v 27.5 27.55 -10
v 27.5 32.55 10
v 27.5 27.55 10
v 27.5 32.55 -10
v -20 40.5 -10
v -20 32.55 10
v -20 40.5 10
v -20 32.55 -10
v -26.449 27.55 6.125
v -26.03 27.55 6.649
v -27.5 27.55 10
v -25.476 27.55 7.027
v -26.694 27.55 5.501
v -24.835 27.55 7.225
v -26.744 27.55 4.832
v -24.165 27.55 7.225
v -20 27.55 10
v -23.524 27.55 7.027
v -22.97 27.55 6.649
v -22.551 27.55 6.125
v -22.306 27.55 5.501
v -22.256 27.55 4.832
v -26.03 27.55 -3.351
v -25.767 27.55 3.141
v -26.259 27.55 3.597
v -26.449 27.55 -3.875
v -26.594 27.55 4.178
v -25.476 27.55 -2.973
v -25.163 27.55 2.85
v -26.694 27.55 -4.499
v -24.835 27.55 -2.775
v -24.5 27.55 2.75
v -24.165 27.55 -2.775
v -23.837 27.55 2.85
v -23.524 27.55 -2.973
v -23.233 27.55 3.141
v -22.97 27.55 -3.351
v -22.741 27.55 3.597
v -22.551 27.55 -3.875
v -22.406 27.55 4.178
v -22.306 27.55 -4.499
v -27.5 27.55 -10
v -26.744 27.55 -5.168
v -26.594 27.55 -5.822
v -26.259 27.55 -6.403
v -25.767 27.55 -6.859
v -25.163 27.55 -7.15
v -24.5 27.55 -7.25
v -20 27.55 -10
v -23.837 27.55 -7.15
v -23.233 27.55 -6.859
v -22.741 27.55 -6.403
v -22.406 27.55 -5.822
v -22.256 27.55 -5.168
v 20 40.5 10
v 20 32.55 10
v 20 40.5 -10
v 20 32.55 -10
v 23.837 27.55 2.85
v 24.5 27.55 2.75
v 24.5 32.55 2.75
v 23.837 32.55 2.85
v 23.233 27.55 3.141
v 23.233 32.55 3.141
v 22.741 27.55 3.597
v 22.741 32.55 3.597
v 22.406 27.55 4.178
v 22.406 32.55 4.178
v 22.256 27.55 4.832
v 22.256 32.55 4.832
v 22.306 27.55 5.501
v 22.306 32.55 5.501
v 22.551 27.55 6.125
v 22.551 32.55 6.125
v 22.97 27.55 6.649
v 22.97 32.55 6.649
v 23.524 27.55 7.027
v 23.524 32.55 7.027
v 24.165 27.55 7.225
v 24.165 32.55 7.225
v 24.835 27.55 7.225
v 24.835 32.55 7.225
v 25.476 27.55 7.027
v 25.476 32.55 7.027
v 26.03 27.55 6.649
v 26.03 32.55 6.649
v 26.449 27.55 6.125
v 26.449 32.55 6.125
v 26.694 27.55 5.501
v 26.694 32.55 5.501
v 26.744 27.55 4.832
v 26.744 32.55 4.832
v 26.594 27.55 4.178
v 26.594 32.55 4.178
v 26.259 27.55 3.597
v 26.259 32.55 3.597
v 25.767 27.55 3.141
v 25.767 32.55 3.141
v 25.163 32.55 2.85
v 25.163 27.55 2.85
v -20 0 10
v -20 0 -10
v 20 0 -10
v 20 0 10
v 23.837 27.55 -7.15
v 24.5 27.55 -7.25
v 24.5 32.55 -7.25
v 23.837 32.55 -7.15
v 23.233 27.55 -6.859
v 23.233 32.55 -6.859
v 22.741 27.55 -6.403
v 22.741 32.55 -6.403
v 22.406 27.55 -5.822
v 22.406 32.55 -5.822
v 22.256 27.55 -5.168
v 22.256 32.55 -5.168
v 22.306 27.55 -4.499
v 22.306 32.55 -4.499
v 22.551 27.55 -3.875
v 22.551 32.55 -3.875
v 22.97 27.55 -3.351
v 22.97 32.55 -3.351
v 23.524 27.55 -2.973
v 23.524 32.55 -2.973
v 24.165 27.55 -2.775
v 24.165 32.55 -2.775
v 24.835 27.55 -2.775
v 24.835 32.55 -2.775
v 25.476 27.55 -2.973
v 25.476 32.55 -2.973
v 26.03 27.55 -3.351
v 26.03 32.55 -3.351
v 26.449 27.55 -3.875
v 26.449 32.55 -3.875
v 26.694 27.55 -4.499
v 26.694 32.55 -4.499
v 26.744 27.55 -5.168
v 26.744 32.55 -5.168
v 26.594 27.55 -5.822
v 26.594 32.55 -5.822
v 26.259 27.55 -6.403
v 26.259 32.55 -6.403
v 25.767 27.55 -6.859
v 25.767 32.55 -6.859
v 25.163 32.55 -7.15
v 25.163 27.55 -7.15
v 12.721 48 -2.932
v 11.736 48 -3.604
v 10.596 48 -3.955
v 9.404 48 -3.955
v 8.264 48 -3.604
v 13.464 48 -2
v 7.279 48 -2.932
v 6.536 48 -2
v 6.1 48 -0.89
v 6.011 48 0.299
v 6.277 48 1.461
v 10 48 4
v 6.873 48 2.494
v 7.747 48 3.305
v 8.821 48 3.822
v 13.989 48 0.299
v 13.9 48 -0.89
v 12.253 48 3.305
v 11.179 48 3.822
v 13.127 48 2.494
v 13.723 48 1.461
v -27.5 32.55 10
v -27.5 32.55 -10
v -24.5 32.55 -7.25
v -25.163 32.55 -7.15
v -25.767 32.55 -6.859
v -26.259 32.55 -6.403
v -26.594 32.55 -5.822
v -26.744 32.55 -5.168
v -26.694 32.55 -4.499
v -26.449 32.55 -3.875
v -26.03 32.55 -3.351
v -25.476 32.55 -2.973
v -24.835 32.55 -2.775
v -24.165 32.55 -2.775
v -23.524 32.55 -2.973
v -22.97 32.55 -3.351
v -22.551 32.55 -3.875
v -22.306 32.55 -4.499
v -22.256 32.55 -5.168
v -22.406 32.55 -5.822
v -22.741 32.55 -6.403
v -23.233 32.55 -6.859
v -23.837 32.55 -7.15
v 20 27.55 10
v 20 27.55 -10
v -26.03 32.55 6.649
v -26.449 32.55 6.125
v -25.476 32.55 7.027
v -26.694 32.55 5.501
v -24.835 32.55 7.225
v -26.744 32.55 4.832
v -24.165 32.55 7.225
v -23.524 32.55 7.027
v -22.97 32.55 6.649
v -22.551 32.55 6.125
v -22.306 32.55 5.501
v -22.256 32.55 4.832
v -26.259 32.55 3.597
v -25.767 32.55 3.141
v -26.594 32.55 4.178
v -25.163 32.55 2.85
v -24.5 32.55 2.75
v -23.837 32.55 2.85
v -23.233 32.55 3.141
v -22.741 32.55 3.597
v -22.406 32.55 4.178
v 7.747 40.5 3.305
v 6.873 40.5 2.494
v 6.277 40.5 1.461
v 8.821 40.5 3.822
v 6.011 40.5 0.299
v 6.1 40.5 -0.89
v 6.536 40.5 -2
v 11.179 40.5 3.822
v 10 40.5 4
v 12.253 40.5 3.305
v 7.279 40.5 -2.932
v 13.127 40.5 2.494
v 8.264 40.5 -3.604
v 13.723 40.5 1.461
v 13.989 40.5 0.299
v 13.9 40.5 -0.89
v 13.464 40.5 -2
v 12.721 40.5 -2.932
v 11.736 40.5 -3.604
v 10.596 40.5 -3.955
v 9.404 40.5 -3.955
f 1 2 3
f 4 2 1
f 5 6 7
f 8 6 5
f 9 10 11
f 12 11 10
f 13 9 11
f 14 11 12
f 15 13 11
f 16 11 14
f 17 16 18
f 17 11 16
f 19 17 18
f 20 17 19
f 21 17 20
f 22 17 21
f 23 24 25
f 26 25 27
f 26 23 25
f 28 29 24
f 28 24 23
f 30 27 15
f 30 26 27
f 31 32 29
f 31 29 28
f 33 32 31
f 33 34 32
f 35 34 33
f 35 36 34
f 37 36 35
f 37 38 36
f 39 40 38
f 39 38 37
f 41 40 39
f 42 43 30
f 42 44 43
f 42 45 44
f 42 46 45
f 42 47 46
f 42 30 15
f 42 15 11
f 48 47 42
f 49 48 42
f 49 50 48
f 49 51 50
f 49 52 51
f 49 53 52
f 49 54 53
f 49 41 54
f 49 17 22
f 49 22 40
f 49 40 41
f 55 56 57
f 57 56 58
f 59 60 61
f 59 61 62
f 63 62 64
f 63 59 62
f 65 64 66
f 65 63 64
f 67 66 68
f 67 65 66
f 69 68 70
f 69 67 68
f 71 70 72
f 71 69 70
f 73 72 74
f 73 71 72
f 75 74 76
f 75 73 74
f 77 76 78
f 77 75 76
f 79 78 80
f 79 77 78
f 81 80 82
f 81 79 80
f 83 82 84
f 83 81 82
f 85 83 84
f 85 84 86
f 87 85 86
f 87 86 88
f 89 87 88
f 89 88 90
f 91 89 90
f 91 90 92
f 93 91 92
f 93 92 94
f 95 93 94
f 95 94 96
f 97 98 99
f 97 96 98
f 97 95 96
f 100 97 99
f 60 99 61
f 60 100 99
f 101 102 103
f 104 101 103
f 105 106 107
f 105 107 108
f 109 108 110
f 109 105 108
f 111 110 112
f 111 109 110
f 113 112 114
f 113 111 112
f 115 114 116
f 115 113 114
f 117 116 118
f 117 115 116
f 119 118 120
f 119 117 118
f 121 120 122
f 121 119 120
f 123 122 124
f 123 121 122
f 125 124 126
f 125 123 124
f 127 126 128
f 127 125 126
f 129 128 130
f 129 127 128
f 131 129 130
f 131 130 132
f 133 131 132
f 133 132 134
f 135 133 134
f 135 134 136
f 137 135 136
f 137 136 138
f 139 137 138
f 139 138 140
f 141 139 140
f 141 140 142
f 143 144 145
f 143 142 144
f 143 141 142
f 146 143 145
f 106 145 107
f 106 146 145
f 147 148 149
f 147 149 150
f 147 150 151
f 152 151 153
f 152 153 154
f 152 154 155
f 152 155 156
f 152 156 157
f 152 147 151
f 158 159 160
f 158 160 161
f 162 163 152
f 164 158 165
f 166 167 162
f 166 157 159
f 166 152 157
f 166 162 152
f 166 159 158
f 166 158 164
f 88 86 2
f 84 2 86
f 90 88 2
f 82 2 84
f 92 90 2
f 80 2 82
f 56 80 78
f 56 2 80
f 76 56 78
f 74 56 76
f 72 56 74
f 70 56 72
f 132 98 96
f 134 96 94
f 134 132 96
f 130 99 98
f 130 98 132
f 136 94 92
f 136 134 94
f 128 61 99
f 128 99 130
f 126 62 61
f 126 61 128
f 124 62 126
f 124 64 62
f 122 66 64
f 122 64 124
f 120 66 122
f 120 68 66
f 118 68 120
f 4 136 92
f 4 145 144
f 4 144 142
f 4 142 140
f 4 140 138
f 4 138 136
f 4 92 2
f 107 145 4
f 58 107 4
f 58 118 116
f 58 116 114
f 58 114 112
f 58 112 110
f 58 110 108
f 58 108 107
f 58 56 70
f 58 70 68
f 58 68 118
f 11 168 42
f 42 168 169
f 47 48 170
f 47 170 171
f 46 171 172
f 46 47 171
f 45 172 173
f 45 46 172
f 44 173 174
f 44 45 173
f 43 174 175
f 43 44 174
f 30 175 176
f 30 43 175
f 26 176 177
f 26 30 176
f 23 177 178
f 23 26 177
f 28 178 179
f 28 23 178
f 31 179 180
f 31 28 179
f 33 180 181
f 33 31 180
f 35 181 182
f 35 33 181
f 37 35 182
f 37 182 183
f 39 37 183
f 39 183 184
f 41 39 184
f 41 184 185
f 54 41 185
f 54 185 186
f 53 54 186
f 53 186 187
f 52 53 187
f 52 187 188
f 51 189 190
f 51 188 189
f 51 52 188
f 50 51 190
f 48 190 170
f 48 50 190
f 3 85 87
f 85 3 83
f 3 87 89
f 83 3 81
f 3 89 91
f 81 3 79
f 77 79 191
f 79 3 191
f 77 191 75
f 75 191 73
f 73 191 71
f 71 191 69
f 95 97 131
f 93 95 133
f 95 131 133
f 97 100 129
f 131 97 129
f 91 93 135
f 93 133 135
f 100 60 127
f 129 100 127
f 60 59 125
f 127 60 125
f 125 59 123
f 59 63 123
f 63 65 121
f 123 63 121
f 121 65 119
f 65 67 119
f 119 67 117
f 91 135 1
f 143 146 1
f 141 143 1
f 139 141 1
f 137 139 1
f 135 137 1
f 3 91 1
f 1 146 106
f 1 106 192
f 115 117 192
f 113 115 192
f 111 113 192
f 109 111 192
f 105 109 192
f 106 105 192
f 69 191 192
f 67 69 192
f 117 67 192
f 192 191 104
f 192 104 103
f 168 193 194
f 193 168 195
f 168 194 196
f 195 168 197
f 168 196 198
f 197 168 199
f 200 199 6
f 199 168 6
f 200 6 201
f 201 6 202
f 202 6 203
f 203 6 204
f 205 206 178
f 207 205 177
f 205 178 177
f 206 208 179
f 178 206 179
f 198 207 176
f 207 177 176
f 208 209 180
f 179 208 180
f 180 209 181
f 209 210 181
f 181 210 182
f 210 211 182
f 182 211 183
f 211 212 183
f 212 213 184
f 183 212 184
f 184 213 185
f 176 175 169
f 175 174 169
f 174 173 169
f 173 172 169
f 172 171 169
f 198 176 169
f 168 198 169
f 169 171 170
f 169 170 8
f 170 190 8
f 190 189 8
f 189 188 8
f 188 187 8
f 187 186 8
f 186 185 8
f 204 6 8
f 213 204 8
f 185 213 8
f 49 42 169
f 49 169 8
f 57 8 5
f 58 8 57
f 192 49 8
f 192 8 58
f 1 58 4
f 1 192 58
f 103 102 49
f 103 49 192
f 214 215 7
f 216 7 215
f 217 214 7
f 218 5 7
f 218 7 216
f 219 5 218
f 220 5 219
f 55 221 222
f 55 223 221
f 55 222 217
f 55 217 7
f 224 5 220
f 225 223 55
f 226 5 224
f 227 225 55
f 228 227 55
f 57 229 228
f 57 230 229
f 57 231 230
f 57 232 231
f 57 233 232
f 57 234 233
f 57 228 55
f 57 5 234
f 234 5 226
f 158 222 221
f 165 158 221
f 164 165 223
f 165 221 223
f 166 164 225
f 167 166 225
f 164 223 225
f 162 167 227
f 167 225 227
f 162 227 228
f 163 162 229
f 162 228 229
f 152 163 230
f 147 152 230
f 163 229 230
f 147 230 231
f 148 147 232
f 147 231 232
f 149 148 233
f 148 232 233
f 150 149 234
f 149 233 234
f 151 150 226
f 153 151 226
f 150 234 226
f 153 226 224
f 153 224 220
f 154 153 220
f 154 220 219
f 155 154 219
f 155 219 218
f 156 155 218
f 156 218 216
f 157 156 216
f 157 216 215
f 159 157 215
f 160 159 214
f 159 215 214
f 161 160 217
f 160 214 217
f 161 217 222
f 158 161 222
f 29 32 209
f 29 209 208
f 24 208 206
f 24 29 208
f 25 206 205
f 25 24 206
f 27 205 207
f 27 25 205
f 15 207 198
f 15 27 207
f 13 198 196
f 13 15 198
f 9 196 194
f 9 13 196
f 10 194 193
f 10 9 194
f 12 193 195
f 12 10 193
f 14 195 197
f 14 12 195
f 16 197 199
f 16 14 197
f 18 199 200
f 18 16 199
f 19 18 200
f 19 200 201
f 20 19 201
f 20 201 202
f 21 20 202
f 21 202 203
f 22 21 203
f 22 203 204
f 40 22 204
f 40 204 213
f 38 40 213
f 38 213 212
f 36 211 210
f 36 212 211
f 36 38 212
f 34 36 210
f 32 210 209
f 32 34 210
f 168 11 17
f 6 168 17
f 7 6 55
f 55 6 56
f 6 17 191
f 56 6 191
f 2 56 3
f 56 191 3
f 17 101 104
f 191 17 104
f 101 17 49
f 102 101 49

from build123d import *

# Parameters (mm, degrees)
SKETCH1_W           = 40
SKETCH1_H           = 20
BOSS_EXTRUDE1_DEPTH = 40.5
SKETCH2_W           = 20
SKETCH2_H           = 5
BOSS_EXTRUDE2_DEPTH = 7.5
SKETCH3_R           = 2.25
CUT_EXTRUDE1_DEPTH  = 50.964987741
SKETCH4_R           = 4
BOSS_EXTRUDE3_DEPTH = 7.5


with BuildPart() as part:
    # Sketch1 → Boss-Extrude1 (new body)
    with BuildSketch(Plane(origin=(0, 0, 0), x_dir=(1, 0, 0), z_dir=(0, 1, 0))):
        Rectangle(SKETCH1_W, SKETCH1_H)
    extrude(amount=BOSS_EXTRUDE1_DEPTH)

    # Sketch2 → Boss-Extrude2 (add)
    with BuildSketch(Plane(origin=(20, 0, 0), x_dir=(0, 0, -1), z_dir=(1, 0, 0))):
        with Locations((0, 30.05)):
            Rectangle(SKETCH2_W, SKETCH2_H)
    boss_extrude2 = extrude(amount=BOSS_EXTRUDE2_DEPTH)

    # Mirror1: Boss-Extrude2 across plane
    add(boss_extrude2.mirror(Plane(origin=(0, 0, 0), x_dir=(0, 0, 1), z_dir=(1, 0, 0))))

    # Sketch3 → Cut-Extrude1 (cut, through all)
    with BuildSketch(Plane(origin=(0, 0, 0), x_dir=(1, 0, 0), z_dir=(0, 1, 0))):
        with Locations(Location((-24.5, 5, 0), (0, 0, 90))):
            Circle(SKETCH3_R)
        with Locations(Location((24.5, 5, 0), (0, 0, 90))):
            Circle(SKETCH3_R)
        with Locations(Location((24.5, -5, 0), (0, 0, 90))):
            Circle(SKETCH3_R)
        with Locations(Location((-24.5, -5, 0), (0, 0, 90))):
            Circle(SKETCH3_R)
    extrude(amount=CUT_EXTRUDE1_DEPTH, mode=Mode.SUBTRACT)

    # Sketch4 → Boss-Extrude3 (add)
    with BuildSketch(Plane(origin=(0, 40.5, 0), x_dir=(1, 0, 0), z_dir=(0, 1, 0))):
        with Locations(Location((10, 0, 0), (0, 0, 270))):
            Circle(SKETCH4_R)
    extrude(amount=BOSS_EXTRUDE3_DEPTH)


solid = part.part
